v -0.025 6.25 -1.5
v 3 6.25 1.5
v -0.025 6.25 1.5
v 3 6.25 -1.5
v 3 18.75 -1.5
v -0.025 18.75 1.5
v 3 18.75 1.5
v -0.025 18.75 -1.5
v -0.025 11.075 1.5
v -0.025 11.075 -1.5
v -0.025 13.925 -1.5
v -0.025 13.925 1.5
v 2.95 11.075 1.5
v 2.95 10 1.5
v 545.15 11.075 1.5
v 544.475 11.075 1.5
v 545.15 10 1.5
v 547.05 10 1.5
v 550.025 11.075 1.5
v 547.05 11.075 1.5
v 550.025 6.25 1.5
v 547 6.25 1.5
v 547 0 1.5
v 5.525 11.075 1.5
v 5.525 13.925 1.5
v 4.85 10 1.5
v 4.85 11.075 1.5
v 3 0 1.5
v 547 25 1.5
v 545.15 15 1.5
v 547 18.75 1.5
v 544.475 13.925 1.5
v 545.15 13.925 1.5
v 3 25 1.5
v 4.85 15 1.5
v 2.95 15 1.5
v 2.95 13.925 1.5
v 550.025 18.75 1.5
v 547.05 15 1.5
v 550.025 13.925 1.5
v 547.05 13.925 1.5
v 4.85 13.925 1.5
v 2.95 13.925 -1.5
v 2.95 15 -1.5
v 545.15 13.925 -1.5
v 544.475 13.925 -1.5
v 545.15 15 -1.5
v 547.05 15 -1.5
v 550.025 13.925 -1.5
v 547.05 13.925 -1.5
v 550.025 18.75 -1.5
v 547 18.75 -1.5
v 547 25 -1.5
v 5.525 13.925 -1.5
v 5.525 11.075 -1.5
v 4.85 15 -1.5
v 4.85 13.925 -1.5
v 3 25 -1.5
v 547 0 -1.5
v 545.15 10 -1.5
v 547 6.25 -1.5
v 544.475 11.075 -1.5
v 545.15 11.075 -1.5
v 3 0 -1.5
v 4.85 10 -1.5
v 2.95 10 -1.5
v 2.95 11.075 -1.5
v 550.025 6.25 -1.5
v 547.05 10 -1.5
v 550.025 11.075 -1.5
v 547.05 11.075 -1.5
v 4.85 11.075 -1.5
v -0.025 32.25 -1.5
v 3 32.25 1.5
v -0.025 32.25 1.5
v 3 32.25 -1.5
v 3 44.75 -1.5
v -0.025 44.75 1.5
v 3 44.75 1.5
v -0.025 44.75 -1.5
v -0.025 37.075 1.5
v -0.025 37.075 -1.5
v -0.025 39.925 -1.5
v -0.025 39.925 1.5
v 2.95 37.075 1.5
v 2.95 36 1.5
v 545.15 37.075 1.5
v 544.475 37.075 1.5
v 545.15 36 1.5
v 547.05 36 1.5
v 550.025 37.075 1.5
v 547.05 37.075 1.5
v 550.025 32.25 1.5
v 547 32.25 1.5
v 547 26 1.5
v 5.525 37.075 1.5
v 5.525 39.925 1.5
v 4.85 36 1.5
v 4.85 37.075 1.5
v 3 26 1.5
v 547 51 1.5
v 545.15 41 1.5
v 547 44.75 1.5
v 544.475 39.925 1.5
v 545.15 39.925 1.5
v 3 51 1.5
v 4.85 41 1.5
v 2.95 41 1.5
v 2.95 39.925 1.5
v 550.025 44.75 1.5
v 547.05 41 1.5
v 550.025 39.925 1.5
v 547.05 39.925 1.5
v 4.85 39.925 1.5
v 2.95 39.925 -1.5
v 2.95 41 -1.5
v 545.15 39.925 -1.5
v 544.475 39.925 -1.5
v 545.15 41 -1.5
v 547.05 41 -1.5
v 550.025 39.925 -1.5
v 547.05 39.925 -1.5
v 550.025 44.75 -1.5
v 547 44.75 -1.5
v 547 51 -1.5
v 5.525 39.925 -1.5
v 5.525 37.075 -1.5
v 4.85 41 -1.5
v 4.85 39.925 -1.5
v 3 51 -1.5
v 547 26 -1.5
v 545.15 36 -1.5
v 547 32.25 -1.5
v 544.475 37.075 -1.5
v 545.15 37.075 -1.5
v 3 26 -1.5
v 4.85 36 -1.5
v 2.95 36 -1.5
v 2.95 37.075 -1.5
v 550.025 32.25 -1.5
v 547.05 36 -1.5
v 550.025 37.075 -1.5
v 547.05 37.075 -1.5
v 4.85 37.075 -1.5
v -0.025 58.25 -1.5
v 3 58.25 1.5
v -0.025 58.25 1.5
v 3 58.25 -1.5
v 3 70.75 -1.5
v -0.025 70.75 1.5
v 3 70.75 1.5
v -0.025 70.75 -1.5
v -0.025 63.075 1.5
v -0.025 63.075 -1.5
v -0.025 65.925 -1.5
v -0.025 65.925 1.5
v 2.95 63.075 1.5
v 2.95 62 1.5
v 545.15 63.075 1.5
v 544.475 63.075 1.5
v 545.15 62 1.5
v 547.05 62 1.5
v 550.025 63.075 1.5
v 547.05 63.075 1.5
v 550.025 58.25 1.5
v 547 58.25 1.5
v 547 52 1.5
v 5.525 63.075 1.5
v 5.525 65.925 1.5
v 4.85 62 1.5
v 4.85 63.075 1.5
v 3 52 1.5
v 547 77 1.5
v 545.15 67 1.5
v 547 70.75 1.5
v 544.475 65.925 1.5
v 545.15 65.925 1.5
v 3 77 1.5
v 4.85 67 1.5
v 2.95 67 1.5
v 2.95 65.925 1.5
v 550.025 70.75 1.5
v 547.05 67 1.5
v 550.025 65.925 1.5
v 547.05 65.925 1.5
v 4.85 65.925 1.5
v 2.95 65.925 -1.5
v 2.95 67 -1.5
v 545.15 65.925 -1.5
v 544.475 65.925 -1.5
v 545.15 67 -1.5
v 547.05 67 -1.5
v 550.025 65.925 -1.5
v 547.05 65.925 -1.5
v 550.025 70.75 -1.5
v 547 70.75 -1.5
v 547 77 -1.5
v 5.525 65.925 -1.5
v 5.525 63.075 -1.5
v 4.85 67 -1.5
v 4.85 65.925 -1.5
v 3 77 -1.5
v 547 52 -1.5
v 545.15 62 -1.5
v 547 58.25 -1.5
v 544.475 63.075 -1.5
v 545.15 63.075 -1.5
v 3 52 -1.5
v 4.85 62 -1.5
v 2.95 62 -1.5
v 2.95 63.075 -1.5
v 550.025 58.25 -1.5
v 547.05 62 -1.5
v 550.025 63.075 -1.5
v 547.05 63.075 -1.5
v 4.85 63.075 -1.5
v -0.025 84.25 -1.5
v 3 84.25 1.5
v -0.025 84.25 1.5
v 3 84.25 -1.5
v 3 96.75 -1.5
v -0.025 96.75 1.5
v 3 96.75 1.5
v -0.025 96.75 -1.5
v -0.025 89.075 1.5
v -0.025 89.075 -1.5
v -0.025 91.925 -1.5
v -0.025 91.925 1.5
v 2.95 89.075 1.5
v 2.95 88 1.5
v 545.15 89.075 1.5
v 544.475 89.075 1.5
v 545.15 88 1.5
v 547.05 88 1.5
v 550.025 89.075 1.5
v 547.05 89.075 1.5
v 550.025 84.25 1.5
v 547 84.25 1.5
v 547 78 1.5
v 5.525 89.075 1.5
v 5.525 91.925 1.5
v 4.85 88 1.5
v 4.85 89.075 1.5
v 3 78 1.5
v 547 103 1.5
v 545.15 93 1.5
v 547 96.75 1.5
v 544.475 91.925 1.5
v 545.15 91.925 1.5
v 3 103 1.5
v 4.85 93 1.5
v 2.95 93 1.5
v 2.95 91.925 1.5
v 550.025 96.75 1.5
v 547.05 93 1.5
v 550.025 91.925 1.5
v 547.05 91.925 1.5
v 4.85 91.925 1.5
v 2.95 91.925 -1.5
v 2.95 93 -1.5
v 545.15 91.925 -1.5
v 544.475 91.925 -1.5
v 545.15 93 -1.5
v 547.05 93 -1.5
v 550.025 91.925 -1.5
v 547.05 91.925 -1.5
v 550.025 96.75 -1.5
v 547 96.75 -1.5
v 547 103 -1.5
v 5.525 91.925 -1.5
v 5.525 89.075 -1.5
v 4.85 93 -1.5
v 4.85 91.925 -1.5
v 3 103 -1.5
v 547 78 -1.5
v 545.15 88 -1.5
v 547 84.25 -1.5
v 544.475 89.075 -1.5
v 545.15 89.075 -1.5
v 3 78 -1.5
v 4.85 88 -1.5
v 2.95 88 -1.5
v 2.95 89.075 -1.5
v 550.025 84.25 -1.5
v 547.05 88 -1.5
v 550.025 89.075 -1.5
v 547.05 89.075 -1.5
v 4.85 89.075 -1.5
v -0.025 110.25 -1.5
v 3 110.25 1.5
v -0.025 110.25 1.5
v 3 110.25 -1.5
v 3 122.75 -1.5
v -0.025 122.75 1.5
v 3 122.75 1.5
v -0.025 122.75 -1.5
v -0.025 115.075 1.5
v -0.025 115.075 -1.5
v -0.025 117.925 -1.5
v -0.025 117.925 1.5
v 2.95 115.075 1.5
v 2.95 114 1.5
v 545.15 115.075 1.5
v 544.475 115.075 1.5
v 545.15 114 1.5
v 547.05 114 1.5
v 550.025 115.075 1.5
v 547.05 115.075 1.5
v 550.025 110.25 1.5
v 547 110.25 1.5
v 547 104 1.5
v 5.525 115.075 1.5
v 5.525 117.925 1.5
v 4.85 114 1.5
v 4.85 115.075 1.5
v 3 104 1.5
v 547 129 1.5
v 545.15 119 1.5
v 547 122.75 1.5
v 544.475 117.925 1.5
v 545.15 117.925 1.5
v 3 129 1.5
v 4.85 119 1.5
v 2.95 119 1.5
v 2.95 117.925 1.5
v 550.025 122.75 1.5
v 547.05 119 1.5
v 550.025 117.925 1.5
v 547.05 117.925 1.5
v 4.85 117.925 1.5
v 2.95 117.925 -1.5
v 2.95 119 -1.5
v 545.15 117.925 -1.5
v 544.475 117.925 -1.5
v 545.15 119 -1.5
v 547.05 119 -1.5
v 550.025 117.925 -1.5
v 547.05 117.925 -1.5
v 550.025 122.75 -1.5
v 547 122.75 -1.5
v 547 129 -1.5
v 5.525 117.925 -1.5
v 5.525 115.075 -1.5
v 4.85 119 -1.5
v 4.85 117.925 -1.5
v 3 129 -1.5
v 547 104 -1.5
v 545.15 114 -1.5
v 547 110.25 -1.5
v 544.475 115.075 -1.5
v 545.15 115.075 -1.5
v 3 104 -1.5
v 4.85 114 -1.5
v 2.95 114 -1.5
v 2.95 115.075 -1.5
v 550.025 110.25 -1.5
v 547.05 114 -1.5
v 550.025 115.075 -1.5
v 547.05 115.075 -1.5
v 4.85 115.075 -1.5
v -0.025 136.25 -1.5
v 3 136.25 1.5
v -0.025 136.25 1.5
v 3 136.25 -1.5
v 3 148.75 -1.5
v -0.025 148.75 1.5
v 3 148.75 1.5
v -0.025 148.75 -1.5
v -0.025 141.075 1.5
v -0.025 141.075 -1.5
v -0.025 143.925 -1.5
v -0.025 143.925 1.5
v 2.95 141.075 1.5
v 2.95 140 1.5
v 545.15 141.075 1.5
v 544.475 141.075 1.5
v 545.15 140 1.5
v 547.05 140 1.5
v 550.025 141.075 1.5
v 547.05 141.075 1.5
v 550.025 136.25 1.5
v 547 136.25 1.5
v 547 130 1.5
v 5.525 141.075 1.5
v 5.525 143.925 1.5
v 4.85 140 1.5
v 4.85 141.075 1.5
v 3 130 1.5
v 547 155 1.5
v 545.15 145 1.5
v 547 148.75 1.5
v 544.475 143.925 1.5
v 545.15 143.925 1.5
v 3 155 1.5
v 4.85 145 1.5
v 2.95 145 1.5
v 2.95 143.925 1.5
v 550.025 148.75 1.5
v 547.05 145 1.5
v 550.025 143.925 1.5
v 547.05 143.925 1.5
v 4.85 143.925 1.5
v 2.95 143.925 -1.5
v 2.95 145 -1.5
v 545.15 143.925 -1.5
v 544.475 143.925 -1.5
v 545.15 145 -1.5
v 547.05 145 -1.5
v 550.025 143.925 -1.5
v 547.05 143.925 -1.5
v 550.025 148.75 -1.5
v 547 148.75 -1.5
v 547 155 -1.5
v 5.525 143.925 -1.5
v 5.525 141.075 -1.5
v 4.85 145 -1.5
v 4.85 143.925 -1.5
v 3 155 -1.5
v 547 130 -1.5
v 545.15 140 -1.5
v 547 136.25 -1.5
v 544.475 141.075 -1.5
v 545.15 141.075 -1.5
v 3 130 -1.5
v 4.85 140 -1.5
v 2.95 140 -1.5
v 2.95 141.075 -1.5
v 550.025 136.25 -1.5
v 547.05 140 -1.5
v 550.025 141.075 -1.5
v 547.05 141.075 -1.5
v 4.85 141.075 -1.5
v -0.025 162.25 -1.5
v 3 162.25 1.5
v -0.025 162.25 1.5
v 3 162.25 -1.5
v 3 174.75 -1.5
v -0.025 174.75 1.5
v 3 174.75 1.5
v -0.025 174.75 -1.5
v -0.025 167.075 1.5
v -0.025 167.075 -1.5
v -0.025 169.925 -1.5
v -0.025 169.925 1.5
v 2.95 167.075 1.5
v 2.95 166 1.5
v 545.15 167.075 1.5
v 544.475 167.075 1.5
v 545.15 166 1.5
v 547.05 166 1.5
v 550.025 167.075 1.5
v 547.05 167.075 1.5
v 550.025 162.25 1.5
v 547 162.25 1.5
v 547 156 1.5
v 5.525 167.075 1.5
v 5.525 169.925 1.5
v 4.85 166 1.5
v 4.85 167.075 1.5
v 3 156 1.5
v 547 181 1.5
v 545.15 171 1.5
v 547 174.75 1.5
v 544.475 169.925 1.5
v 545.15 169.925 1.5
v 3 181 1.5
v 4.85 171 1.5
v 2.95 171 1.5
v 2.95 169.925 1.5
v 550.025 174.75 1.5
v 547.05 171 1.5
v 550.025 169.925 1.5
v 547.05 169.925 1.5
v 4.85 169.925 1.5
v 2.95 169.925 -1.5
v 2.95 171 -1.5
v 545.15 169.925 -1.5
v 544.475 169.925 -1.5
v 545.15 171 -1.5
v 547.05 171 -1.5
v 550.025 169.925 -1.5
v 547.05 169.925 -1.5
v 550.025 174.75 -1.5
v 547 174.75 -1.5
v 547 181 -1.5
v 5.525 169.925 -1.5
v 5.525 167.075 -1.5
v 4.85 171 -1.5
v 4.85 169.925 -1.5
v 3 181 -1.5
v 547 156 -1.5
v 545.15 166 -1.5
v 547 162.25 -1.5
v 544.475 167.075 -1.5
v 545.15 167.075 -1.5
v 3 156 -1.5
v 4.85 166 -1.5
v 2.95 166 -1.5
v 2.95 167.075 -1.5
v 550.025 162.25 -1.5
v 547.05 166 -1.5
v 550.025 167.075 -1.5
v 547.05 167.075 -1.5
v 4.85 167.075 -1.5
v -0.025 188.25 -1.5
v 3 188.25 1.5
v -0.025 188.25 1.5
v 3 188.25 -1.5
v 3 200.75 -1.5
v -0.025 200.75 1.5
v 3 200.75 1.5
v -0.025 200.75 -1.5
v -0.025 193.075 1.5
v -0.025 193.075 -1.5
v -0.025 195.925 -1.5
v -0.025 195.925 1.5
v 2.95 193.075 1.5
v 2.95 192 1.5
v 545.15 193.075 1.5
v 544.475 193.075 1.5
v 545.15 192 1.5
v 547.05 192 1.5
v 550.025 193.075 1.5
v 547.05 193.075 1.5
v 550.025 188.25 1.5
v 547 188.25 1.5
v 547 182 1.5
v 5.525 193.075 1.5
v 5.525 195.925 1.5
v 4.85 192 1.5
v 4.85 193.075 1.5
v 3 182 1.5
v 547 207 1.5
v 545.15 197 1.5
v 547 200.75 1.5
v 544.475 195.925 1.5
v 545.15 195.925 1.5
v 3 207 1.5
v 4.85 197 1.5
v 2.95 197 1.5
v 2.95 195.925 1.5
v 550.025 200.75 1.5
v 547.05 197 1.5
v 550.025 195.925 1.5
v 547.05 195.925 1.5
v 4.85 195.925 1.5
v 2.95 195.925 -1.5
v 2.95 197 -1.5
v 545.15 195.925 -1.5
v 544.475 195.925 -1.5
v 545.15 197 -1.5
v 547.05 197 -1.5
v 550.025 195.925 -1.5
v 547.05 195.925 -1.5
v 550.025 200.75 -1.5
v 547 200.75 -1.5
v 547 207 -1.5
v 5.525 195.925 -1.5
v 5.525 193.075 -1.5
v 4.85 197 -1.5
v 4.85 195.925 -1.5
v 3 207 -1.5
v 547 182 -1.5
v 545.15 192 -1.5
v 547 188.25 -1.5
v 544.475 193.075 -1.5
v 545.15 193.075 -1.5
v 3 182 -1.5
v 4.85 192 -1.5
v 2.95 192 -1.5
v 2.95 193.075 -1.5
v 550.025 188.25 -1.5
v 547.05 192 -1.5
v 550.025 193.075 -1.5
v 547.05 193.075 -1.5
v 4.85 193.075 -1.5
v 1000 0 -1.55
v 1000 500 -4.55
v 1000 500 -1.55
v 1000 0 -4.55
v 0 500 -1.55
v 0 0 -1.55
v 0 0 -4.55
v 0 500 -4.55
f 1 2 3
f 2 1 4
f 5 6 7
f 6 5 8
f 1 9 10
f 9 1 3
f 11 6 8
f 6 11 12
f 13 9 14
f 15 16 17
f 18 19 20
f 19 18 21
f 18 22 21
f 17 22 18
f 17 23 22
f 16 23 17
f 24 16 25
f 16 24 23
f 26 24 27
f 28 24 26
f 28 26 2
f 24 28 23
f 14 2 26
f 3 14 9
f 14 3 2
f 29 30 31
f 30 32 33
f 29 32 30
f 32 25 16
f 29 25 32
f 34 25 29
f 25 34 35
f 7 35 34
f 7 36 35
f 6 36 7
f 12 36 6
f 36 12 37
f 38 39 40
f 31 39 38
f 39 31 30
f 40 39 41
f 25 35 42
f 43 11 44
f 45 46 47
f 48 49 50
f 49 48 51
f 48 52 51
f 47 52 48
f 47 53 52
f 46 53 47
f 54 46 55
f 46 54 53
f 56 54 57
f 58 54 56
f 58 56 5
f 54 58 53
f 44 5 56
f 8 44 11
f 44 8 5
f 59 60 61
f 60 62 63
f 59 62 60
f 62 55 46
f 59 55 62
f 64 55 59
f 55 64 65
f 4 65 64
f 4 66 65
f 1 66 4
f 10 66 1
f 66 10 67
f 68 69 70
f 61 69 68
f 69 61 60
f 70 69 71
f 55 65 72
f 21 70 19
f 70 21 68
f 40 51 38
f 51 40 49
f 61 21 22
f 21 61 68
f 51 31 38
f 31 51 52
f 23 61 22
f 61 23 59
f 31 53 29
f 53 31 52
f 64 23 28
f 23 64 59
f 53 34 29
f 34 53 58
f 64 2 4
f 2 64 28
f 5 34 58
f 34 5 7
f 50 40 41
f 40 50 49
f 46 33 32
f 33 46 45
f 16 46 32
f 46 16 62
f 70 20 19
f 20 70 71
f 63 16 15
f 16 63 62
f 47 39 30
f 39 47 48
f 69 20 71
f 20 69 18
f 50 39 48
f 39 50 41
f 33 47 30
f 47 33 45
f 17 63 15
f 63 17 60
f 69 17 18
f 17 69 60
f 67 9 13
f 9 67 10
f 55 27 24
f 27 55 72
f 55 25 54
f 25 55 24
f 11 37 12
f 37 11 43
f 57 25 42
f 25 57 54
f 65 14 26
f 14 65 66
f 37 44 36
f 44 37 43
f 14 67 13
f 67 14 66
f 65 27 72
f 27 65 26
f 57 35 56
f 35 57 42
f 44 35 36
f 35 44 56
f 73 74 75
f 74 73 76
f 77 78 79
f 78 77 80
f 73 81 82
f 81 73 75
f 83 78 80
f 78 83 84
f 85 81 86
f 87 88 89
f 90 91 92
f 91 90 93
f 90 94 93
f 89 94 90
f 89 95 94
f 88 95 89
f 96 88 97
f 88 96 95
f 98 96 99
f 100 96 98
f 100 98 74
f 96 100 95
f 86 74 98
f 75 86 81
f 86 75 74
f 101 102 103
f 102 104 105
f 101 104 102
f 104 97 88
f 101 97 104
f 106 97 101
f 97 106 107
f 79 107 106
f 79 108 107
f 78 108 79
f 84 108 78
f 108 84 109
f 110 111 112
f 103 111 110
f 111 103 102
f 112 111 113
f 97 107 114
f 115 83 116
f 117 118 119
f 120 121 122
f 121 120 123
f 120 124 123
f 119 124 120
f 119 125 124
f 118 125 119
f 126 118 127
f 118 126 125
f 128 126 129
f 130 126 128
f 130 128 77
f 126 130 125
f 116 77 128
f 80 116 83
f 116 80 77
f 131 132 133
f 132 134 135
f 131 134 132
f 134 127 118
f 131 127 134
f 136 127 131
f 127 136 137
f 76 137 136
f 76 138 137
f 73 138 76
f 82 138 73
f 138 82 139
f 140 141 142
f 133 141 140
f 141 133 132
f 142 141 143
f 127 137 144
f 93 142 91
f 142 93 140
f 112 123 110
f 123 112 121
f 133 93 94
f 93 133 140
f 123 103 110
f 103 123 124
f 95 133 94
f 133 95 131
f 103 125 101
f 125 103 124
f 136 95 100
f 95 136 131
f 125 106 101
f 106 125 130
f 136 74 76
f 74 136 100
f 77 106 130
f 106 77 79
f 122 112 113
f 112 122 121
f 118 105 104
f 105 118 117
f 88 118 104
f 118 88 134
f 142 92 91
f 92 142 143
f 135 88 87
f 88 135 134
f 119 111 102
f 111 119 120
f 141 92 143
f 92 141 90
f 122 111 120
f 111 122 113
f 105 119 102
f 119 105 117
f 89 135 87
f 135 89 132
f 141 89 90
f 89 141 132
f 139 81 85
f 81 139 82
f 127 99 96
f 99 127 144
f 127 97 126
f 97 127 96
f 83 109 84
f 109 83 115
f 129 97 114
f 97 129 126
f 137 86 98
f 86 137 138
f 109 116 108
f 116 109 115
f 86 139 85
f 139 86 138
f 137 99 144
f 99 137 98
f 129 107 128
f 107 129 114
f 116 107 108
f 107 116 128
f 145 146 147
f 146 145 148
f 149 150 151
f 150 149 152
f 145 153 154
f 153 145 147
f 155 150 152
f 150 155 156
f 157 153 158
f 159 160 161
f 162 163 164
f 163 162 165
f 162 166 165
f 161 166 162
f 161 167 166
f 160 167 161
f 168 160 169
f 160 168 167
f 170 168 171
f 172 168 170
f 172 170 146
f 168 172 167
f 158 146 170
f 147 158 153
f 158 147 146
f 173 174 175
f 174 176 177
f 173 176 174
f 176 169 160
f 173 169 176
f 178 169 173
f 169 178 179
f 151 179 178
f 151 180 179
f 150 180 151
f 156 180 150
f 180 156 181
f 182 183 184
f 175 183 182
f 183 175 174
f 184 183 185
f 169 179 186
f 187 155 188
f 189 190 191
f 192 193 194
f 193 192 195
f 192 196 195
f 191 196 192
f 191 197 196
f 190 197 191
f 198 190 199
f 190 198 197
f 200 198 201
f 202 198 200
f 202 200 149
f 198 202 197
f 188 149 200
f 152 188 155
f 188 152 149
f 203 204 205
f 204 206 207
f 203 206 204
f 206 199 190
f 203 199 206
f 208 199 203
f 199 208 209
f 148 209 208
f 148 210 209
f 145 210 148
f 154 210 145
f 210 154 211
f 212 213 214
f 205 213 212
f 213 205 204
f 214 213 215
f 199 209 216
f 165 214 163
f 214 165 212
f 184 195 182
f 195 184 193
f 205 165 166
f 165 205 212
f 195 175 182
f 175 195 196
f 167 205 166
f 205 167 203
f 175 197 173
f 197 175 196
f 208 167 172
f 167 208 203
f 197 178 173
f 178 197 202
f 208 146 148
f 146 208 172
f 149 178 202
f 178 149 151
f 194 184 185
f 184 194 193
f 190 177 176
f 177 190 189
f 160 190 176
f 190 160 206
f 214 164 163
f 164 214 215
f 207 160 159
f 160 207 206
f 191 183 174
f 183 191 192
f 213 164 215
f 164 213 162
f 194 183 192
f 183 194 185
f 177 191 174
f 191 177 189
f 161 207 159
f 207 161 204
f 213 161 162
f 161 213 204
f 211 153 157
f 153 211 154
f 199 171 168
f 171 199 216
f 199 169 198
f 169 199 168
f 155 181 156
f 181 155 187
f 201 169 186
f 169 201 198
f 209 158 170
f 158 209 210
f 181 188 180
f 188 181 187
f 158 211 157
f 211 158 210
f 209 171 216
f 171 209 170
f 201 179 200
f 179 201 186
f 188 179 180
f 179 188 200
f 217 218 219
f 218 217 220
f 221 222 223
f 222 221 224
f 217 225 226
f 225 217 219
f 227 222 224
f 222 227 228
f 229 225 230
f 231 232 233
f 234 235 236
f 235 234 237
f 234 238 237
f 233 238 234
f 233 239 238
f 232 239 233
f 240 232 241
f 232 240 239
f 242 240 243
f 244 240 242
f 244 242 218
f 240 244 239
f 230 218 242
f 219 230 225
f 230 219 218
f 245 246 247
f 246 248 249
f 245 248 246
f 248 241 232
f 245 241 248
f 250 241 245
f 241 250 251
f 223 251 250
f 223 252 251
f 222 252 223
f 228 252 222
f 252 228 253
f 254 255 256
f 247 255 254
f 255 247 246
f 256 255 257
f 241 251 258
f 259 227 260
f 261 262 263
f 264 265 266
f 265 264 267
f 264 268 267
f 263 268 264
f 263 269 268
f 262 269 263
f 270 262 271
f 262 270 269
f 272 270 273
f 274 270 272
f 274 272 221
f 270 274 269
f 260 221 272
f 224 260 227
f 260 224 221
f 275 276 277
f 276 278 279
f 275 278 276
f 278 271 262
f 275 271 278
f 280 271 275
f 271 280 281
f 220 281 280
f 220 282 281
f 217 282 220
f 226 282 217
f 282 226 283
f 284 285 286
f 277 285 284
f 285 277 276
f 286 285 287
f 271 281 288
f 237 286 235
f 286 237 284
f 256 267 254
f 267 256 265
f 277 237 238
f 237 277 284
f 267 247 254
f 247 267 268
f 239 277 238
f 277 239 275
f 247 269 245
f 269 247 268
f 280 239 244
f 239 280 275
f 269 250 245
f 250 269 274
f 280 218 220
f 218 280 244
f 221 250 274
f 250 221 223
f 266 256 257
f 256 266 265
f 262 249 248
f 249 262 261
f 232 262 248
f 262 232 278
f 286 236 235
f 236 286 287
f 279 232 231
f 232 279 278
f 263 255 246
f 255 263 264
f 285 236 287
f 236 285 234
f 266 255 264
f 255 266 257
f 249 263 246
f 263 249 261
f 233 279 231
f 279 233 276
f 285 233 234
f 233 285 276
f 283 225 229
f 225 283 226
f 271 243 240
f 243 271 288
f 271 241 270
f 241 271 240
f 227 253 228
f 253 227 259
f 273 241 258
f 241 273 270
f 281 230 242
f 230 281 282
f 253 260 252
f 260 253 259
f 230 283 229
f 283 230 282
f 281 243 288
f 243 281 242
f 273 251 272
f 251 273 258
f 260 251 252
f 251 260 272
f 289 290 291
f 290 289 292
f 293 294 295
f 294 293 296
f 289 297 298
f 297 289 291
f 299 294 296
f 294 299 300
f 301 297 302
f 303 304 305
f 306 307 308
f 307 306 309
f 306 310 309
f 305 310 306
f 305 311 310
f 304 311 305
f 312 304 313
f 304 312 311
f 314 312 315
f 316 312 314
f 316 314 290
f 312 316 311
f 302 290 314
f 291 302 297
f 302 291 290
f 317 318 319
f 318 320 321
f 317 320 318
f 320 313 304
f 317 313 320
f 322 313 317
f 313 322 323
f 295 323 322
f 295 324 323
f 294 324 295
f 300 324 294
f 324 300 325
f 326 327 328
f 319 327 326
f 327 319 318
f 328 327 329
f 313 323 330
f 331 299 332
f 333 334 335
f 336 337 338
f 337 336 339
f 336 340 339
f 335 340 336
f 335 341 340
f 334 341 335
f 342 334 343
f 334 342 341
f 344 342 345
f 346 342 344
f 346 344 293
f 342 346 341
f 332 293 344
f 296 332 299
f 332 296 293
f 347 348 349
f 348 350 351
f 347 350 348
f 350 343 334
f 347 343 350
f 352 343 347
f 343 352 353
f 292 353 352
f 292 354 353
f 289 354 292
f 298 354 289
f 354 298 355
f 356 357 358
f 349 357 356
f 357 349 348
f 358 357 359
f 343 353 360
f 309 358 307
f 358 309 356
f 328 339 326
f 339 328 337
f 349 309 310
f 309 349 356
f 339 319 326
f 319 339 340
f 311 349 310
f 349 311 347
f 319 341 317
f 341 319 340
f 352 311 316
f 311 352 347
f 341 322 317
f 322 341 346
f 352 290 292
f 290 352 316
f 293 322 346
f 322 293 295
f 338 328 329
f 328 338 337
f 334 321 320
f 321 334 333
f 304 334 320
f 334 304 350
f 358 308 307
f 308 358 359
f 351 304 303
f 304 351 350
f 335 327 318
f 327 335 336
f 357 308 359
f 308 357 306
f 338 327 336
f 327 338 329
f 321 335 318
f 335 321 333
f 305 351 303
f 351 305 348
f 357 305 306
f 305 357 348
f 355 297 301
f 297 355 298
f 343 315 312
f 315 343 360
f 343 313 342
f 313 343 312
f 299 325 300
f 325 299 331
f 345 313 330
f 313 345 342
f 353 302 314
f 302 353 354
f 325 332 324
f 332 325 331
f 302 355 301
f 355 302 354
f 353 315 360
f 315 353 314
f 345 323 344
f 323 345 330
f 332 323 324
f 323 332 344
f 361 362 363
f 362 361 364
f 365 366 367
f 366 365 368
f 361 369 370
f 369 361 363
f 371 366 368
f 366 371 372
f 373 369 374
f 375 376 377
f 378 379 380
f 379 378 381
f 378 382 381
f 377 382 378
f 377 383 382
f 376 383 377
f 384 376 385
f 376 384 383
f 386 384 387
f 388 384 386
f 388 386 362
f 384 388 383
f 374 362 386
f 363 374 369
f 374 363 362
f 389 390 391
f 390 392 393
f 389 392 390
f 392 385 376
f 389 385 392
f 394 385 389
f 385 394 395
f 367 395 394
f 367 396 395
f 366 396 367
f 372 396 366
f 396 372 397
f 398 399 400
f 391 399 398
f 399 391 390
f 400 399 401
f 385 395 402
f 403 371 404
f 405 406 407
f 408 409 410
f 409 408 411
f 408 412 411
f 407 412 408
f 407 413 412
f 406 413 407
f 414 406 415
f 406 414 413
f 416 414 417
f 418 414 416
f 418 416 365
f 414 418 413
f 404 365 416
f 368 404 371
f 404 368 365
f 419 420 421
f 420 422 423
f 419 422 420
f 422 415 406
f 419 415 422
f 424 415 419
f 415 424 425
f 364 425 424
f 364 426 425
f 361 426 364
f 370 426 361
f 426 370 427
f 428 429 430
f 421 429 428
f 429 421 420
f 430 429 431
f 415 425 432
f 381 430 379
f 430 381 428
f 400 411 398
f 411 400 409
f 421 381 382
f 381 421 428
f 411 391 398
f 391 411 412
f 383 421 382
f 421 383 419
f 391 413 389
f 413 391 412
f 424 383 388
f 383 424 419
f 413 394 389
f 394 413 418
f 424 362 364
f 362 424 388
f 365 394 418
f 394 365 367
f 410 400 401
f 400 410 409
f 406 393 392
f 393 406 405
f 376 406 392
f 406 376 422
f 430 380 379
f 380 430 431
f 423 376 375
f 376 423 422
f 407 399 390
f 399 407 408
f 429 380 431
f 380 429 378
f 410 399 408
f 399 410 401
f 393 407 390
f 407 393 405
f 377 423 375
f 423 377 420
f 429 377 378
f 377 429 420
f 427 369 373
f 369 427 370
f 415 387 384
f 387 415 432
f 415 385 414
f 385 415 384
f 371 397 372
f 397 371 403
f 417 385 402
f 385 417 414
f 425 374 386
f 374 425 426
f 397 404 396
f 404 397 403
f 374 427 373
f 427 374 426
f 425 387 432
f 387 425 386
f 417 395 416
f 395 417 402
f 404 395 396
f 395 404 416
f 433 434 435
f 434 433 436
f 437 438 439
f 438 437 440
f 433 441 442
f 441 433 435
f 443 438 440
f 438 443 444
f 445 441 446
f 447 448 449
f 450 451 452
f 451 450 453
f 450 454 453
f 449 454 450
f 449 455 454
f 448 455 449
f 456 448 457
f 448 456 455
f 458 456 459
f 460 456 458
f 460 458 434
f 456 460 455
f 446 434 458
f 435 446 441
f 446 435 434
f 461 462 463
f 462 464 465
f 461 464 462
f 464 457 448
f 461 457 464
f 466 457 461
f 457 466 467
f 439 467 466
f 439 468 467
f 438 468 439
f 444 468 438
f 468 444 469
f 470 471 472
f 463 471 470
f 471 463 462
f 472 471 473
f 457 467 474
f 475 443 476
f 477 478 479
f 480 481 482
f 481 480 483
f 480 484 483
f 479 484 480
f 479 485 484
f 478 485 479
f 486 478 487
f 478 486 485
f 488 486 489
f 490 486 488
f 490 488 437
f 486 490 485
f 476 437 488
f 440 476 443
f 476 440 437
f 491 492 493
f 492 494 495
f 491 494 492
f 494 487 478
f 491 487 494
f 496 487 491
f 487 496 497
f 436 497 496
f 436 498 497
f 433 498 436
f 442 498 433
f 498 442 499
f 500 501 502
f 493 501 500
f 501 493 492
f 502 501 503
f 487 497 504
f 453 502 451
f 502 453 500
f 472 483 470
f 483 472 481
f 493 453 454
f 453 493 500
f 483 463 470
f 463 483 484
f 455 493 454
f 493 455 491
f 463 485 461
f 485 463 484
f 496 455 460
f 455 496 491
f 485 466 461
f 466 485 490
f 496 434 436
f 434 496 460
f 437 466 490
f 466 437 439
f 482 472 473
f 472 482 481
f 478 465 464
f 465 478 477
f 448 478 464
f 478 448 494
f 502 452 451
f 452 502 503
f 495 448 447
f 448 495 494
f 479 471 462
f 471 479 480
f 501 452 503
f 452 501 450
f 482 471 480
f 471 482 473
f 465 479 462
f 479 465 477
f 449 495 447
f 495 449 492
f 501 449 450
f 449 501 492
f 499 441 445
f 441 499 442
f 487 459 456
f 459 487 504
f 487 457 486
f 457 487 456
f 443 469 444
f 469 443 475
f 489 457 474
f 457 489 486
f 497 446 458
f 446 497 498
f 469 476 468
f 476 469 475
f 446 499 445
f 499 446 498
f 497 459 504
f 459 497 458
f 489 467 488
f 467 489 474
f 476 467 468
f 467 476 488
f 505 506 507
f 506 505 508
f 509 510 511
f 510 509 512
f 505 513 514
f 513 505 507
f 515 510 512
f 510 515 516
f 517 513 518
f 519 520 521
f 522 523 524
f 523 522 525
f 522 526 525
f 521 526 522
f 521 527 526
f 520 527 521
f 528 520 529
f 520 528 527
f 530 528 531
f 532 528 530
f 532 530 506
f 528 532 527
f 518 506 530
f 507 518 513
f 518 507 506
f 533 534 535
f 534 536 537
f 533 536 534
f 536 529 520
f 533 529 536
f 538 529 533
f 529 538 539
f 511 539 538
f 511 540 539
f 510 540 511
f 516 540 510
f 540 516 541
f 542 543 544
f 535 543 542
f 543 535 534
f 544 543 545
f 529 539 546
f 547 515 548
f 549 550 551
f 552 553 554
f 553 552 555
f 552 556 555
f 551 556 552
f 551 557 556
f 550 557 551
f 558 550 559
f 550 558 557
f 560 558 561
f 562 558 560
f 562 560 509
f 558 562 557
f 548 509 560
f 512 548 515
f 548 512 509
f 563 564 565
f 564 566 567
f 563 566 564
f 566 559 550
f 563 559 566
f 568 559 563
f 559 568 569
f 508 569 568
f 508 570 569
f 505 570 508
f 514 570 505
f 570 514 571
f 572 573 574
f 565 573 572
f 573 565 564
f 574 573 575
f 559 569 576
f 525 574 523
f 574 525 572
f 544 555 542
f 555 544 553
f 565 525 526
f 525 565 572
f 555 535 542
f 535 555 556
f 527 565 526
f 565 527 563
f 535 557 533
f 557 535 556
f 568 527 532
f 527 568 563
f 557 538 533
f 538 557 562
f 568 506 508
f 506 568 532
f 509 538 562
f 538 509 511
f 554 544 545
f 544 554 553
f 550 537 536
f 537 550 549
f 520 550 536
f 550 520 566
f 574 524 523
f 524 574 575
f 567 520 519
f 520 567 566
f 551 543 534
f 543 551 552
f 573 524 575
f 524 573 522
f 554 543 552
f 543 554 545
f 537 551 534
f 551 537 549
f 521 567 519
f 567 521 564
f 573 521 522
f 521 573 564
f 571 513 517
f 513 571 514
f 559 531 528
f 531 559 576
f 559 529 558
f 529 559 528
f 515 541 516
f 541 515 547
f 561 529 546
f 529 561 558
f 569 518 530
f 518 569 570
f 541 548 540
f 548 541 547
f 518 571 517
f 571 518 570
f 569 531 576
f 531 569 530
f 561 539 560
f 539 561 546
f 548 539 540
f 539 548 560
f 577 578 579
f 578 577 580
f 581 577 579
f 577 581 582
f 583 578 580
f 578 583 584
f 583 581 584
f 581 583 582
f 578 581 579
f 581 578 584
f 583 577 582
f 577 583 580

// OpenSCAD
// file: ../corners.scad
$fn = 200;
nothing = 0.05;

/**
 * @brief Draws a round corner in the XY plane.
 */
module round_corner_outside(x=1, y=1, z=1)
{
    scale([x, y, 1])
    translate([0, 0, -z/2])
    intersection()
    {
        // full circle
        linear_extrude(z)
        circle(1);

        // x >= 0; y >= 0;
        cube([x, y, z]);
    }
}

/**
 * @brief Draws a round corner in the XY plane.
 */
module round_corner_inside(x=1, y=1, z=1)
{
    scale([x, y, z])
    translate([0, 0, -1/2])
    difference()
    {
        // x >= 0; y >= 0;
        cube([1, 1, 1]);

        translate([1, 1, -nothing/2])
        linear_extrude(1 + nothing)
        circle(1);
    }
}

/**
 * @brief Draws a round end/tip
 * @param x Total width
 * @param y Total height
 * @param z Material thickness
 * @param d Length of flat middle part
 */
module round_tip(x=1, y=1, z=1, d=0)
{
    // width of the rounded corners
    e = (x-d)/2;

    // left corner
    translate([-d/2, 0, 0])
    mirror()
    round_corner_outside(e, y, z);

    // right corner
    translate([+d/2, 0, 0])
    round_corner_outside(e, y, z);

    // flat middle part
    translate([0, y/2, 0])
    cube([d, y, z], center=true);
}

rotate(180)
round_corner_outside(10, 8, 1);

round_corner_inside(10, 8, 1);

translate([0, 10, 0])
round_tip(25, 8, 1, 5);
// file: ../screw.scad
include <config.scad>;

/*
 * Positive model of a cavity
 * required for pressing in a nut
 * and screwing in a screw
 */
module screw_cavity()
{
    // cavity for the screw thread
    translate([
        0,
        0,
        -screw_length/2
        ])
    cube([
        screw_diameter,
        material_z + 2*nothing,
        screw_length
        ], center=true);

    // cavity for the nut
    translate([
        0,
        0,
        - nut_offset - nut_height/2
        ])
    cube([
        nut_wrench_size,
        material_z + 2*nothing,
        nut_height
        ], center=true);
}

screw_cavity();
// file: side.scad
include <../config.scad>;
use <../corners.scad>;

module wall_side_without_holes()
{
    // vertical side bar
    translate([0, 0, wall_z/2])
    cube([
        material_z,
        wall_y,
        wall_z
        ], center=true);

    // rounded top excrescence
    translate([0, 0, wall_z])
    rotate([90, 0, 90])
    round_tip(wall_y, wall_round_top_z, material_z, wall_y/4);

    // horizontal foot bars
    translate([0, -(foot_y_front - foot_round_y)/2, +foot_z/2])
    cube([
        material_z,
        foot_y_front - foot_round_y,
        foot_z
        ], center=true);

    translate([0, (foot_y_back - foot_round_y)/2, +foot_z/2])
    cube([
        material_z,
        foot_y_back - foot_round_y,
        foot_z
        ], center=true);

    // round corners on top of the foot
    translate([0, wall_y/2, foot_z])
    rotate([0, -90, 0])
    round_corner_inside(
        wall_y,
        foot_y_back - wall_y/2 - foot_round_y,
        material_z
        );

    translate([0, -wall_y/2, foot_z])
    rotate([0, -90, 180])
    round_corner_inside(
        wall_y,
        foot_y_front - wall_y/2 - foot_round_y,
        material_z
        );

    // round corners on the sides of the foot
    translate([0, foot_y_back - foot_round_y, 0])
    rotate([90, 0, 90])
    round_corner_outside(
        foot_round_y,
        foot_z,
        material_z
        );

    translate([0, - foot_y_front + foot_round_y, 0])
    rotate([90, 0, -90])
    round_corner_outside(
        foot_round_y,
        foot_z,
        material_z
        );
}

module wall_side()
{
    difference()
    {
        wall_side_without_holes();

        // nose cutouts for horizontal beams
        usable_z = wall_z - support_z_offset;
        delta_z = usable_z / (support_count-1);
        offset_z = support_z_offset  - support_z/2;
        color("brown")
        for (i=[1:support_count])
        {
            translate([
                0,
                0,
                offset_z + (i-1) * delta_z
                ])
            cube(
                [
                material_z*2,
                material_z,
                support_z/2
                ], center=true);
        }

        // foot gap
        translate([
            0,
            (foot_y_back - foot_y_front)/2,
            foot_gap_z/2
            ])
        cube([
            material_z*2,
            foot_gap_y,
            foot_gap_z + nothing
            ], center=true);
    }
}

wall_side();
// file: beam.scad
include <../config.scad>;
use <../screw.scad>;

module wall_beam_without_screw_holes()
{
    // beam
    cube([
        wall_x - 2*material_z,
        material_z,
        support_z
        ], center=true);

    // noses
    for (x = [
            - wall_x/2 + material_z/2,
            + wall_x/2 - material_z/2
            ])
        translate([x, 0, 0])
        cube([
            material_z + nothing,
            material_z,
            support_z/2
            ], center=true);
}

module wall_beam()
{
    difference()
    {
        wall_beam_without_screw_holes();

        // right screw
        translate([+ wall_x/2 + nothing, 0, 0])
        rotate([0, 90, 0])
        screw_cavity();

        // left screw
        translate([- wall_x/2 - nothing, 0, 0])
        translate([])
        rotate([0, -90, 0])
        screw_cavity();
    }
}

wall_beam();
// file: ../config.scad
// all measures in millimeters

// rendering quality
$fn = 200;
nothing = 0.05;

// material to cut from
material_x = 1000;
material_y = 500;
material_z = 3;

// plate to cut from
module base_material()
{
    translate([0, 0, -material_z*3/2-nothing])
    cube([
        material_x,
        material_y,
        material_z
        ]);
}

// wall configuration: bounding box measures
wall_x = 550;
wall_y = 30;
wall_z = 510;

// the round top is added on top of the wall
wall_round_top_z = 8;

// length of the foot towards the front and back of the wall (asymmetrical)
foot_y_back = 100;
foot_y_front = 190;
foot_y = foot_y_front + foot_y_back;

// foot height
foot_z = 25;

// rounded corners at front and back of the foot
foot_round_y = 20;

foot_gap_y = (foot_y_front + foot_y_back) * 0.8;
foot_gap_z = material_z;

// number of support beams
support_count = 8;

// height of a support beam
support_z = 25;

// offset of first support from z=0
support_z_offset = 50;

// pot configuration: outer measures of the top opening
// small pots:
pot_x = 70;
pot_y = 70;
pot_z = 40;
/*
// medium size pots:
pot_x = 80;
pot_y = 80;
pot_z = 50;
*/

// pots have hooks to hang at the wall supports
hook_width = 10;

// screw: M3
screw_diameter = 2.85;
screw_length = 5.5;
nut_height = 2.4 -0.5;
nut_wrench_size = 5.0;
nut_offset = material_z;
washer_radius = 7;
// main file
include <../config.scad>;
use <beam.scad>;
use <side.scad>;

spacing = 1;

// planar arrangement of all parts required for the wall
module parts()
{
    // middle supports
    translate([wall_x/2, support_z/2, 0])
    for (i=[0:support_count-1])
    {
        translate([0, i*(support_z + spacing), 0])
        rotate([90, 0, 0])
        wall_beam();
    }
}

color("brown")
base_material();
parts();
